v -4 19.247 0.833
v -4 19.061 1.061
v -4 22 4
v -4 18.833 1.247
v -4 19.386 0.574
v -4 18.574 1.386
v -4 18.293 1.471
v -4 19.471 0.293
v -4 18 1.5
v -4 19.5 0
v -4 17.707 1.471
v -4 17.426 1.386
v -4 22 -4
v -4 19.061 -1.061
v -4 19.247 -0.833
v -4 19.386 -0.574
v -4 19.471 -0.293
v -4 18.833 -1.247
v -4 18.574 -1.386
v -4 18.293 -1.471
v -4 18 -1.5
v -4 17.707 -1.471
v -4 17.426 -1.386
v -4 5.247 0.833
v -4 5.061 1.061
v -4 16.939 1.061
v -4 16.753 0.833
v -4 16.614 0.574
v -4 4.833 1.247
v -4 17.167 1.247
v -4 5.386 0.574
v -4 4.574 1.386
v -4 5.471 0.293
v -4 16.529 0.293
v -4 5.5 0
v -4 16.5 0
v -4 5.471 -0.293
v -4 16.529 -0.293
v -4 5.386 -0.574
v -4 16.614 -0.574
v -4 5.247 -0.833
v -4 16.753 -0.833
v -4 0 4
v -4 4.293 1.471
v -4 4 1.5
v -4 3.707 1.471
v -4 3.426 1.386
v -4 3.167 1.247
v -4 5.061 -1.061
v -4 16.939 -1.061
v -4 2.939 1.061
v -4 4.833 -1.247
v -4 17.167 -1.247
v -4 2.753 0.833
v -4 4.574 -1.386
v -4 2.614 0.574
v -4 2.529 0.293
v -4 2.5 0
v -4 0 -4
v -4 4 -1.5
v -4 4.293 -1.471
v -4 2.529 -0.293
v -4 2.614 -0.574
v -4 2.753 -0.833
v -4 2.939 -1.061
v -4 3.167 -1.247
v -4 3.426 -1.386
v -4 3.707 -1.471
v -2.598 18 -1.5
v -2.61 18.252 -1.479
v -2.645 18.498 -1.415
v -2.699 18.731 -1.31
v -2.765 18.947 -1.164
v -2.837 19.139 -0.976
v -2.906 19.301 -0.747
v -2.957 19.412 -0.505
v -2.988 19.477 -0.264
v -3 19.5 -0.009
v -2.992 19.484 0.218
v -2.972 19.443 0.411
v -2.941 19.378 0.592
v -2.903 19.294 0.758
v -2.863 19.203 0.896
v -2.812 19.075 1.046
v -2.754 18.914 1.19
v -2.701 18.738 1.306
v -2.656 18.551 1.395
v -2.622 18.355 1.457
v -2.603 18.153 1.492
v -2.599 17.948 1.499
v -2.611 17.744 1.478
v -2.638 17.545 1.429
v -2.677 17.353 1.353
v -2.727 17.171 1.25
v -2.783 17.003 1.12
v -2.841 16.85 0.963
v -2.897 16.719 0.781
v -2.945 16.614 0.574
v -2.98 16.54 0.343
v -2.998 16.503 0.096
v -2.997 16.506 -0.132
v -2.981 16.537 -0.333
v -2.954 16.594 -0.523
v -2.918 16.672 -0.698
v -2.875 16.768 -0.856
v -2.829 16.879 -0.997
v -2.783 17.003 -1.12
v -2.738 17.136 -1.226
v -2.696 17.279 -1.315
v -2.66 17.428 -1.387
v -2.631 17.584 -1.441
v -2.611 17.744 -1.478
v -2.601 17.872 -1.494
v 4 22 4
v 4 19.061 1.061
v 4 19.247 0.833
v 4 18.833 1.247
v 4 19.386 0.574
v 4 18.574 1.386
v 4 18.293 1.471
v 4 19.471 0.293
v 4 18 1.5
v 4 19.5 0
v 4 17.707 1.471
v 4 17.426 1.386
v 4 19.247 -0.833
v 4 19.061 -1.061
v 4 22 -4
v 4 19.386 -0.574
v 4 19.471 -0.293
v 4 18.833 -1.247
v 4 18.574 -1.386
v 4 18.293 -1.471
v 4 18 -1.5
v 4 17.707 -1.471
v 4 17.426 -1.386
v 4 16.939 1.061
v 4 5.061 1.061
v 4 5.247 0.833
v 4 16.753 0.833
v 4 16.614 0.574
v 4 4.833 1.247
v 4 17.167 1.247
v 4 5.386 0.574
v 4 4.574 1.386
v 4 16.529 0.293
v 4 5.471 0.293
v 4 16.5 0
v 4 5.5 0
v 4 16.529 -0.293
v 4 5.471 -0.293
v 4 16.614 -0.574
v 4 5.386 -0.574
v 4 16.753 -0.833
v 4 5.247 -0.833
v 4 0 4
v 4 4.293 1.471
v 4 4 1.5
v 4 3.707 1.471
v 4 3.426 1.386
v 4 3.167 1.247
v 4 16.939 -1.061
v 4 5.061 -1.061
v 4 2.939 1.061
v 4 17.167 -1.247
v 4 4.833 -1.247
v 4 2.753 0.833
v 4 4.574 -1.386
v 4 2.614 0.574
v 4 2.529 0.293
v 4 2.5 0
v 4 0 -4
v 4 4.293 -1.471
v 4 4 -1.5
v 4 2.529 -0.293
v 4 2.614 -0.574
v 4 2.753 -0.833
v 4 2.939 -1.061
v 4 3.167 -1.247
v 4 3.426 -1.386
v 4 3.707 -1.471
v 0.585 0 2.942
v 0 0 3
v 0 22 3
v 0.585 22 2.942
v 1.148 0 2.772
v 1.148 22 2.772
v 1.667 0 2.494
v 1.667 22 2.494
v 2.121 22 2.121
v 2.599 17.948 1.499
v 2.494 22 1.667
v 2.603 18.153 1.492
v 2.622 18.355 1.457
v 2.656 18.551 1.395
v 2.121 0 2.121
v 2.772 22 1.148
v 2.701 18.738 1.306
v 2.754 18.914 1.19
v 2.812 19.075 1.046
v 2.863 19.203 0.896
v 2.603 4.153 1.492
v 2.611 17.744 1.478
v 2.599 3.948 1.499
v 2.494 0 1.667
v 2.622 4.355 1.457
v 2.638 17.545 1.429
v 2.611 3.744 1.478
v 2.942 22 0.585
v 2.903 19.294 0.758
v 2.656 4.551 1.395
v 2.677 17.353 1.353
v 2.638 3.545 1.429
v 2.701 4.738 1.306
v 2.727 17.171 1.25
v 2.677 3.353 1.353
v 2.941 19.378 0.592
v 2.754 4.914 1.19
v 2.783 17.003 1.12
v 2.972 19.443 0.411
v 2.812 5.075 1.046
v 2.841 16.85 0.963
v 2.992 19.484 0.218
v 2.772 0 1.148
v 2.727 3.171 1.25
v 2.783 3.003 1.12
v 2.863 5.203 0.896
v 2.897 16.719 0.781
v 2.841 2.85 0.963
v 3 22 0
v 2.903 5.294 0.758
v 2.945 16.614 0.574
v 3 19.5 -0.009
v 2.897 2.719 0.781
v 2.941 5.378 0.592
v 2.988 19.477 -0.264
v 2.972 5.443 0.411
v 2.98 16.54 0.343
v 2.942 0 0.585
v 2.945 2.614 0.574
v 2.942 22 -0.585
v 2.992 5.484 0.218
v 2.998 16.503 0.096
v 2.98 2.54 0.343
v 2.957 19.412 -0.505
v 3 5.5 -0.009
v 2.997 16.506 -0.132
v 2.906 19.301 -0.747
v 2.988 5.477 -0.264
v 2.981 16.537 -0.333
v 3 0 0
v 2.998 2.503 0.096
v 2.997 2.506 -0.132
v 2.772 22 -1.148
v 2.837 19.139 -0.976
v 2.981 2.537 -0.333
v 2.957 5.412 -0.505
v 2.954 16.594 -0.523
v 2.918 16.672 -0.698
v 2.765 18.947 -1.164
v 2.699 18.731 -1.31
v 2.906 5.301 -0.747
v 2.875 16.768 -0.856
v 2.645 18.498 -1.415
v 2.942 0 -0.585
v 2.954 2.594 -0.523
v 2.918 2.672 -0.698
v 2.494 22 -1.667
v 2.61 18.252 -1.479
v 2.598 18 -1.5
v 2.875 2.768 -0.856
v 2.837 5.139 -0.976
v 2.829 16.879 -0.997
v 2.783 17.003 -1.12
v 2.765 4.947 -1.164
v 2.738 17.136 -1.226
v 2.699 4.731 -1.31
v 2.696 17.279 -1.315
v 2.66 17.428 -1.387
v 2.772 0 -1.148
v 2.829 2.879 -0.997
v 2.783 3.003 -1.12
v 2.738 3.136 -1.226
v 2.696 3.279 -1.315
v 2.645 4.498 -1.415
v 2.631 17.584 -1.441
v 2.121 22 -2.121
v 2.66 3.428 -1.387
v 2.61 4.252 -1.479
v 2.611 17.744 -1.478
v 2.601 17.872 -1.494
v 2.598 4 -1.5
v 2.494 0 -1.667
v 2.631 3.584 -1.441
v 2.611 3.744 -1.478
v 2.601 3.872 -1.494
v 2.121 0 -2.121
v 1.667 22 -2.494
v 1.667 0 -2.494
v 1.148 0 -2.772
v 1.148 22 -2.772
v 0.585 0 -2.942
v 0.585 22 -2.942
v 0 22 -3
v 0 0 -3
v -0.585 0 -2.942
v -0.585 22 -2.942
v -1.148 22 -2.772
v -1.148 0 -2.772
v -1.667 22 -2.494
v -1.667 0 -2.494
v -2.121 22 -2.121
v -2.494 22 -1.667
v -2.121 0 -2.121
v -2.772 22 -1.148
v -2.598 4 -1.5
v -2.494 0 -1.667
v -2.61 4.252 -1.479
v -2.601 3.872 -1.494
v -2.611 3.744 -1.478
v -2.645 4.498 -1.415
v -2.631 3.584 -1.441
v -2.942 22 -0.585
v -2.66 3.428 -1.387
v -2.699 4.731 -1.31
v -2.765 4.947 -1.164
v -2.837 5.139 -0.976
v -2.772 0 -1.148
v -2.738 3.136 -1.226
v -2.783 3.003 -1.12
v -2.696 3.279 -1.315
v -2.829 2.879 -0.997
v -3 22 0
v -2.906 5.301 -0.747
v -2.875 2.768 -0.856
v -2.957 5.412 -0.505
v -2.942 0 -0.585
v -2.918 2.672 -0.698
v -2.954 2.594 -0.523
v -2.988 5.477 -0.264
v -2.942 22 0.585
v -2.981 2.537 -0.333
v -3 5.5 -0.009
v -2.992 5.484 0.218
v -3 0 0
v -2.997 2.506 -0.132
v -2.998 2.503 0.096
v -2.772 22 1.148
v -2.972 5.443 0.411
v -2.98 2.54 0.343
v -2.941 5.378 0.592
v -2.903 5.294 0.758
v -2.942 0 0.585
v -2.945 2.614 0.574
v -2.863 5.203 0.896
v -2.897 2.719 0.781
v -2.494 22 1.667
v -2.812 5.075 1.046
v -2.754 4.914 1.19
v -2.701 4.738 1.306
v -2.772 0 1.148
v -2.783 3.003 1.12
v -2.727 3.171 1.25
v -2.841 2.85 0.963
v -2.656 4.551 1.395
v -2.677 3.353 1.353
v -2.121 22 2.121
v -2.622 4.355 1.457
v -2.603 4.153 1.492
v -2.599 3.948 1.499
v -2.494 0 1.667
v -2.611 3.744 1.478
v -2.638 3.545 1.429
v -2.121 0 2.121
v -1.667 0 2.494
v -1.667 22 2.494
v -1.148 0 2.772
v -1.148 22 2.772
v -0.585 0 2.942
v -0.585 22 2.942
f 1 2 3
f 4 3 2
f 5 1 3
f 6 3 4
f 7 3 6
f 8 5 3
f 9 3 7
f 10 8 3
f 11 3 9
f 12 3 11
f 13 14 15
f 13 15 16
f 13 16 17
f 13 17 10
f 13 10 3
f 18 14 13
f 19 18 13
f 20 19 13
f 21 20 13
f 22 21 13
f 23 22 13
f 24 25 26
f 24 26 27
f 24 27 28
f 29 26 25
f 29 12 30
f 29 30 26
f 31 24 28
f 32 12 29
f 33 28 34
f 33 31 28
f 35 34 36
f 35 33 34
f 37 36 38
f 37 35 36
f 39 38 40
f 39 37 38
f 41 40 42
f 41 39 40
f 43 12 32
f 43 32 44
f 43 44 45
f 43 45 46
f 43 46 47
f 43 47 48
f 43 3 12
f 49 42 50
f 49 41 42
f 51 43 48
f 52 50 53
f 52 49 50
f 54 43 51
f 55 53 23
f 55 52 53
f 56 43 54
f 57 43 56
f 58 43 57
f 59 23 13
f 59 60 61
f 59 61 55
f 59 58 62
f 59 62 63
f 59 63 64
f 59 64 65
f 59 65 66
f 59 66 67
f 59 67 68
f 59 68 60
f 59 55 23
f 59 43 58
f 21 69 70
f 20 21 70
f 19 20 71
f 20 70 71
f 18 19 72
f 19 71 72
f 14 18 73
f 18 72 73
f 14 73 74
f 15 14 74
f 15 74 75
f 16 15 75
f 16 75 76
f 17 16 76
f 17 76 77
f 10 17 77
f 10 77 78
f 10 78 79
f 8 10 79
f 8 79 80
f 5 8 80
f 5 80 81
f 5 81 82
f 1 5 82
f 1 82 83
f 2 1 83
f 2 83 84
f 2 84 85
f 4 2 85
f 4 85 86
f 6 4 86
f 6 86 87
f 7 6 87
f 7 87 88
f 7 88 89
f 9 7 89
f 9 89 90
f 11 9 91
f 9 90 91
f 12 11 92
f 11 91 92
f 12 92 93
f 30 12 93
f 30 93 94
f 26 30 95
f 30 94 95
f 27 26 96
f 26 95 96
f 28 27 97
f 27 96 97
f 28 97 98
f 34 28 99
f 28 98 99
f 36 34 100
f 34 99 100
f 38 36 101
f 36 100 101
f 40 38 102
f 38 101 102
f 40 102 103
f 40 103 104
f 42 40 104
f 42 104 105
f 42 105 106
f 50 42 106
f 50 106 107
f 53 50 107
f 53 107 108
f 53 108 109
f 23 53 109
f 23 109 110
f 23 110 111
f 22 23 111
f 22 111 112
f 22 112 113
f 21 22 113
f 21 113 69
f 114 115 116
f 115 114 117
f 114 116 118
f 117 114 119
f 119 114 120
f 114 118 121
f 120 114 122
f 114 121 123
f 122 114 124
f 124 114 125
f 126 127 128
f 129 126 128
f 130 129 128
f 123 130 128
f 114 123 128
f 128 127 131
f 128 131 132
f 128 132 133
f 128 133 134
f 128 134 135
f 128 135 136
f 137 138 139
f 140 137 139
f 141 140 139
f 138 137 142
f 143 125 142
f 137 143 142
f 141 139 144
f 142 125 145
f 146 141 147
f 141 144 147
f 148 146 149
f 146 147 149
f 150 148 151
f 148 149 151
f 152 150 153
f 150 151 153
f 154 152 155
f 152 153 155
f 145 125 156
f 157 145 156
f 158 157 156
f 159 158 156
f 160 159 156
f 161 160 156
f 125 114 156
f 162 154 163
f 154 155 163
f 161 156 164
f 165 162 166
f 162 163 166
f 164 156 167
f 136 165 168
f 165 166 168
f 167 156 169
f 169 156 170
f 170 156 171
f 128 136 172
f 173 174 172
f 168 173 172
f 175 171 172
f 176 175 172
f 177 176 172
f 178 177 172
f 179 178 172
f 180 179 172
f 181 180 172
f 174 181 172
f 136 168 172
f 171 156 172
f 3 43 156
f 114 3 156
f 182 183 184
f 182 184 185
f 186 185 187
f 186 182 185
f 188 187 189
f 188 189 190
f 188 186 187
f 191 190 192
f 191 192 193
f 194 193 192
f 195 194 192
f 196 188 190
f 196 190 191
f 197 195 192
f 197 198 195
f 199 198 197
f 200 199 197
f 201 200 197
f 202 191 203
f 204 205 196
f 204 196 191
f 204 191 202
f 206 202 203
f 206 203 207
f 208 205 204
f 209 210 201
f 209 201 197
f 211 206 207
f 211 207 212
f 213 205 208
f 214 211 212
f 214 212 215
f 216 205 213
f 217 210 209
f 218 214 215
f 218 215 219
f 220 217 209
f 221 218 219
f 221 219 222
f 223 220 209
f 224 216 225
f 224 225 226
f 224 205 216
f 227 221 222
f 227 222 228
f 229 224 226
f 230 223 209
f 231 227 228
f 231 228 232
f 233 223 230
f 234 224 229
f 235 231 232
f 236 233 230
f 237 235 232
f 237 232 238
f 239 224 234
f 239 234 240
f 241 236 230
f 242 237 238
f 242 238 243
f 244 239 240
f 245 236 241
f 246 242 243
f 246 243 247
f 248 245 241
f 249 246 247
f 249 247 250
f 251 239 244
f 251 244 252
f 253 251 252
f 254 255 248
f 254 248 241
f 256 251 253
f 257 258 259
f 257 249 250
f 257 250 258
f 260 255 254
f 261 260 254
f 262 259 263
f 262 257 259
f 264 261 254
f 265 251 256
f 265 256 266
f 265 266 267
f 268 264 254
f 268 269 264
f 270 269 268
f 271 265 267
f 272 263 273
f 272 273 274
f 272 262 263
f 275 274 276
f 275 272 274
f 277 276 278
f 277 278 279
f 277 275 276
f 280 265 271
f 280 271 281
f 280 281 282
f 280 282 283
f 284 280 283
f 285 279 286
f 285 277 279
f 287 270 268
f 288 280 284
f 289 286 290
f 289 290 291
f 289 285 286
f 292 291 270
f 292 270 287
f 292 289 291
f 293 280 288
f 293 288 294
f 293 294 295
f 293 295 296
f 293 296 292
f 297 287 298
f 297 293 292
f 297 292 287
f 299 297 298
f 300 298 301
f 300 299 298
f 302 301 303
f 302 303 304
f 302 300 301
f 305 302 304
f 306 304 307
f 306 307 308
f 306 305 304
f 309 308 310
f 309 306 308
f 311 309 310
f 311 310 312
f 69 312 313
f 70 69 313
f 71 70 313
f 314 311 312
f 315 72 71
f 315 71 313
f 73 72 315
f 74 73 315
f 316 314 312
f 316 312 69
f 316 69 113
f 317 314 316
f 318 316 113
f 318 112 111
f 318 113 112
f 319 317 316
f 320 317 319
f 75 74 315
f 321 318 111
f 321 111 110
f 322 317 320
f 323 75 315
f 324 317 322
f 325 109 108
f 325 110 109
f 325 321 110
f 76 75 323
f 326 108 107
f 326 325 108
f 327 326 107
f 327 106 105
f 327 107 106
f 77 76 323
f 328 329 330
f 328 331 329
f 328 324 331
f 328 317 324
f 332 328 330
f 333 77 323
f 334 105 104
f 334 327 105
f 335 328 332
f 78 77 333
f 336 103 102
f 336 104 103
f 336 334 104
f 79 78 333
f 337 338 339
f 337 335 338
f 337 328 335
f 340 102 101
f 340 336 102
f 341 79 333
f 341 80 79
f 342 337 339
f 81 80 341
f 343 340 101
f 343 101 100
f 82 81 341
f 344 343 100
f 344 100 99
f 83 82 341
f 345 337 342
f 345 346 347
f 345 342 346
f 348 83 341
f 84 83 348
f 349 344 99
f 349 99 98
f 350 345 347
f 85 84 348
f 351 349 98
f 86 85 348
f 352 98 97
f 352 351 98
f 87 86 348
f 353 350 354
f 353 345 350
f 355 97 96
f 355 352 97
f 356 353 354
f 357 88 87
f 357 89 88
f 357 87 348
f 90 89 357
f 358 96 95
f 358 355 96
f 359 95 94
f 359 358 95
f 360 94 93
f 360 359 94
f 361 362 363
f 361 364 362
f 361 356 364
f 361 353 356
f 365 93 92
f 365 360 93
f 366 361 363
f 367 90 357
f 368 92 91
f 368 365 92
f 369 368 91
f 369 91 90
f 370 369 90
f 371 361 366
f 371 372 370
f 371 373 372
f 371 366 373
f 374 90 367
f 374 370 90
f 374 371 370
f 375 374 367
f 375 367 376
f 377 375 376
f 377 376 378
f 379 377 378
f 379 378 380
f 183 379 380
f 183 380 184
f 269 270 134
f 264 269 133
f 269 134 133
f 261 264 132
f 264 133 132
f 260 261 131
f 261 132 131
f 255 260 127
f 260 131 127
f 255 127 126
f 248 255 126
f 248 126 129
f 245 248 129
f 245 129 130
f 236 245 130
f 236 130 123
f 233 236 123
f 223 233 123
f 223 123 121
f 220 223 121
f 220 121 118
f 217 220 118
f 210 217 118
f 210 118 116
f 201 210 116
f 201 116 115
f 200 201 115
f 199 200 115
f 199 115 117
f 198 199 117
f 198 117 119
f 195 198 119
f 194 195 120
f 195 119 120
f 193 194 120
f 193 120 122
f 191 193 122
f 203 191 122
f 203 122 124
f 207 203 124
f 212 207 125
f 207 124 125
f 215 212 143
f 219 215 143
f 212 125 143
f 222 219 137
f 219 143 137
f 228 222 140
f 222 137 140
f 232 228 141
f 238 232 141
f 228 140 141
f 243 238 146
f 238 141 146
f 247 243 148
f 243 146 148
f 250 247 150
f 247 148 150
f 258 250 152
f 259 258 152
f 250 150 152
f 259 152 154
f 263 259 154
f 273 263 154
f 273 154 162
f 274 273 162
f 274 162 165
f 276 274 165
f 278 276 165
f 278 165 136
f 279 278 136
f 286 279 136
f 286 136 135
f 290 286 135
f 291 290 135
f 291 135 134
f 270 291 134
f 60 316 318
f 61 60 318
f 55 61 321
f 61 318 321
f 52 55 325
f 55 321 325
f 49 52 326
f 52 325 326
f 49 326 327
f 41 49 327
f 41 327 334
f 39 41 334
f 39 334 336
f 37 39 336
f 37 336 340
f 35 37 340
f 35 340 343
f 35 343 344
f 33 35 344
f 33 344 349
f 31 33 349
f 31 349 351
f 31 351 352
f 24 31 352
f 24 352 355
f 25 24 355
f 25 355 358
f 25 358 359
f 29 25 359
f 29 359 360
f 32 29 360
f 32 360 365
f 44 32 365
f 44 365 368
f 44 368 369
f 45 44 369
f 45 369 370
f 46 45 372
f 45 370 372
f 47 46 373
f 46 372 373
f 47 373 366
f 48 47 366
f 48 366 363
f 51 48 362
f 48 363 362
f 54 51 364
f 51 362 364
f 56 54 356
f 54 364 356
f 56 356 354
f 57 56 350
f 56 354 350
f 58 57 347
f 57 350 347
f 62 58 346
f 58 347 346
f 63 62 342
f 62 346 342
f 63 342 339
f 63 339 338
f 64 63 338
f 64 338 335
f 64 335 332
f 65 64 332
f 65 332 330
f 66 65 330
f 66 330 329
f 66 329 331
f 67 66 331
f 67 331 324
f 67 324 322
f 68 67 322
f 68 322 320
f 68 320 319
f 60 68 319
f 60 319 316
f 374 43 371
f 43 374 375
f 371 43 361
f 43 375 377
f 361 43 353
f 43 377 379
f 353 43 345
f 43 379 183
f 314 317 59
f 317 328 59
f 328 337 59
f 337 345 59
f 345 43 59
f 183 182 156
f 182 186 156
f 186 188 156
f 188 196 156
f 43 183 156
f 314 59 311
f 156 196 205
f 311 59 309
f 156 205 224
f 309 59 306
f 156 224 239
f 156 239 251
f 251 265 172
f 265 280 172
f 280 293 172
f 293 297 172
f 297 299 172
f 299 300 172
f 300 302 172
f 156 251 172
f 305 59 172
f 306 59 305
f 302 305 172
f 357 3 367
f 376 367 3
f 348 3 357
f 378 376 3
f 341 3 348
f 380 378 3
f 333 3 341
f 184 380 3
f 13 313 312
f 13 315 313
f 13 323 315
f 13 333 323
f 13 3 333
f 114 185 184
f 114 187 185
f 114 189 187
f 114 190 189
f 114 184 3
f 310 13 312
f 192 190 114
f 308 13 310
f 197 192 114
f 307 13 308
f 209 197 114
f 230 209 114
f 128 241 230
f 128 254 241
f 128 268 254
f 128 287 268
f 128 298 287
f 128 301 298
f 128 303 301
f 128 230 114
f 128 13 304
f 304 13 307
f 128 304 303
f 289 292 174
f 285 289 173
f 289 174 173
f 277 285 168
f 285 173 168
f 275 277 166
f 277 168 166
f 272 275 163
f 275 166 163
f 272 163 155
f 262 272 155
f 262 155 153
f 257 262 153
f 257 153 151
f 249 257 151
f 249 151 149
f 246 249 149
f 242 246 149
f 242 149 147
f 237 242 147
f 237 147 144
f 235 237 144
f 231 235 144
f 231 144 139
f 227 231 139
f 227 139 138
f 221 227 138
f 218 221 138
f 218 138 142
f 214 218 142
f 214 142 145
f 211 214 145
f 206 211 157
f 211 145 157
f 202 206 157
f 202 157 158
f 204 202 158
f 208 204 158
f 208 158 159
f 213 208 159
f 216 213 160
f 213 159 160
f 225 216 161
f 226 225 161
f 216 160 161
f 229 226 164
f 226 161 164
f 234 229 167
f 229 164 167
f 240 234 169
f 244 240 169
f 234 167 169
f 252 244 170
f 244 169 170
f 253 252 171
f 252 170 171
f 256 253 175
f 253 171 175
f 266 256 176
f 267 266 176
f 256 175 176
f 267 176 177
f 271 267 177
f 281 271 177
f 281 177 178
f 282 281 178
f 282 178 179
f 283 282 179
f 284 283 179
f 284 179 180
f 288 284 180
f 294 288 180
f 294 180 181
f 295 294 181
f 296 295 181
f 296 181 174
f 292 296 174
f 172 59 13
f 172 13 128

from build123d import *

# Parameters (mm, degrees)
SKETCH1_W           = 8
SKETCH1_H           = 8
SKETCH1_R           = 3
BOSS_EXTRUDE2_DEPTH = 22
CUT_EXTRUDE1_REACH  = 25.749
SKETCH2_R           = 1.5


with BuildPart() as part:
    # Sketch1 → Boss-Extrude2 (new body)
    with BuildSketch(Plane(origin=(0, 0, 0), x_dir=(1, 0, 0), z_dir=(0, 1, 0))):
        Rectangle(SKETCH1_W, SKETCH1_H)
        with Locations(Location((0, 0, 0), (0, 0, 270))):
            Circle(SKETCH1_R, mode=Mode.SUBTRACT)
    extrude(amount=BOSS_EXTRUDE2_DEPTH)

    # Cut-Extrude1: up to this face of the body (flat: up to its plane)
    cut_extrude1_end = Plane(part.part.faces().sort_by_distance((-4, 11, 0))[0])
    # Sketch2 → Cut-Extrude1 (cut, up to the picked face)
    with BuildSketch(Plane(origin=(4, 0, 0), x_dir=(0, 0, -1), z_dir=(1, 0, 0)), mode=Mode.PRIVATE) as cut_extrude1_sk1:
        with Locations((0, 18)):
            Circle(SKETCH2_R)
    cut_extrude1_tool1 = split(extrude(cut_extrude1_sk1.sketch, amount=-CUT_EXTRUDE1_REACH, mode=Mode.PRIVATE), bisect_by=cut_extrude1_end, keep=Keep.BOTH, mode=Mode.PRIVATE)
    # Sketch2 → Cut-Extrude1 (cut, up to the picked face)
    with BuildSketch(Plane(origin=(4, 0, 0), x_dir=(0, 0, -1), z_dir=(1, 0, 0)), mode=Mode.PRIVATE) as cut_extrude1_sk2:
        with Locations((0, 4)):
            Circle(SKETCH2_R)
    cut_extrude1_tool2 = split(extrude(cut_extrude1_sk2.sketch, amount=-CUT_EXTRUDE1_REACH, mode=Mode.PRIVATE), bisect_by=cut_extrude1_end, keep=Keep.BOTH, mode=Mode.PRIVATE)
    add(cut_extrude1_tool1.solids().sort_by(Axis((4, 18, 0), (-1, 0, 0)))[0], mode=Mode.SUBTRACT)
    add(cut_extrude1_tool2.solids().sort_by(Axis((4, 4, 0), (-1, 0, 0)))[0], mode=Mode.SUBTRACT)


solid = part.part
